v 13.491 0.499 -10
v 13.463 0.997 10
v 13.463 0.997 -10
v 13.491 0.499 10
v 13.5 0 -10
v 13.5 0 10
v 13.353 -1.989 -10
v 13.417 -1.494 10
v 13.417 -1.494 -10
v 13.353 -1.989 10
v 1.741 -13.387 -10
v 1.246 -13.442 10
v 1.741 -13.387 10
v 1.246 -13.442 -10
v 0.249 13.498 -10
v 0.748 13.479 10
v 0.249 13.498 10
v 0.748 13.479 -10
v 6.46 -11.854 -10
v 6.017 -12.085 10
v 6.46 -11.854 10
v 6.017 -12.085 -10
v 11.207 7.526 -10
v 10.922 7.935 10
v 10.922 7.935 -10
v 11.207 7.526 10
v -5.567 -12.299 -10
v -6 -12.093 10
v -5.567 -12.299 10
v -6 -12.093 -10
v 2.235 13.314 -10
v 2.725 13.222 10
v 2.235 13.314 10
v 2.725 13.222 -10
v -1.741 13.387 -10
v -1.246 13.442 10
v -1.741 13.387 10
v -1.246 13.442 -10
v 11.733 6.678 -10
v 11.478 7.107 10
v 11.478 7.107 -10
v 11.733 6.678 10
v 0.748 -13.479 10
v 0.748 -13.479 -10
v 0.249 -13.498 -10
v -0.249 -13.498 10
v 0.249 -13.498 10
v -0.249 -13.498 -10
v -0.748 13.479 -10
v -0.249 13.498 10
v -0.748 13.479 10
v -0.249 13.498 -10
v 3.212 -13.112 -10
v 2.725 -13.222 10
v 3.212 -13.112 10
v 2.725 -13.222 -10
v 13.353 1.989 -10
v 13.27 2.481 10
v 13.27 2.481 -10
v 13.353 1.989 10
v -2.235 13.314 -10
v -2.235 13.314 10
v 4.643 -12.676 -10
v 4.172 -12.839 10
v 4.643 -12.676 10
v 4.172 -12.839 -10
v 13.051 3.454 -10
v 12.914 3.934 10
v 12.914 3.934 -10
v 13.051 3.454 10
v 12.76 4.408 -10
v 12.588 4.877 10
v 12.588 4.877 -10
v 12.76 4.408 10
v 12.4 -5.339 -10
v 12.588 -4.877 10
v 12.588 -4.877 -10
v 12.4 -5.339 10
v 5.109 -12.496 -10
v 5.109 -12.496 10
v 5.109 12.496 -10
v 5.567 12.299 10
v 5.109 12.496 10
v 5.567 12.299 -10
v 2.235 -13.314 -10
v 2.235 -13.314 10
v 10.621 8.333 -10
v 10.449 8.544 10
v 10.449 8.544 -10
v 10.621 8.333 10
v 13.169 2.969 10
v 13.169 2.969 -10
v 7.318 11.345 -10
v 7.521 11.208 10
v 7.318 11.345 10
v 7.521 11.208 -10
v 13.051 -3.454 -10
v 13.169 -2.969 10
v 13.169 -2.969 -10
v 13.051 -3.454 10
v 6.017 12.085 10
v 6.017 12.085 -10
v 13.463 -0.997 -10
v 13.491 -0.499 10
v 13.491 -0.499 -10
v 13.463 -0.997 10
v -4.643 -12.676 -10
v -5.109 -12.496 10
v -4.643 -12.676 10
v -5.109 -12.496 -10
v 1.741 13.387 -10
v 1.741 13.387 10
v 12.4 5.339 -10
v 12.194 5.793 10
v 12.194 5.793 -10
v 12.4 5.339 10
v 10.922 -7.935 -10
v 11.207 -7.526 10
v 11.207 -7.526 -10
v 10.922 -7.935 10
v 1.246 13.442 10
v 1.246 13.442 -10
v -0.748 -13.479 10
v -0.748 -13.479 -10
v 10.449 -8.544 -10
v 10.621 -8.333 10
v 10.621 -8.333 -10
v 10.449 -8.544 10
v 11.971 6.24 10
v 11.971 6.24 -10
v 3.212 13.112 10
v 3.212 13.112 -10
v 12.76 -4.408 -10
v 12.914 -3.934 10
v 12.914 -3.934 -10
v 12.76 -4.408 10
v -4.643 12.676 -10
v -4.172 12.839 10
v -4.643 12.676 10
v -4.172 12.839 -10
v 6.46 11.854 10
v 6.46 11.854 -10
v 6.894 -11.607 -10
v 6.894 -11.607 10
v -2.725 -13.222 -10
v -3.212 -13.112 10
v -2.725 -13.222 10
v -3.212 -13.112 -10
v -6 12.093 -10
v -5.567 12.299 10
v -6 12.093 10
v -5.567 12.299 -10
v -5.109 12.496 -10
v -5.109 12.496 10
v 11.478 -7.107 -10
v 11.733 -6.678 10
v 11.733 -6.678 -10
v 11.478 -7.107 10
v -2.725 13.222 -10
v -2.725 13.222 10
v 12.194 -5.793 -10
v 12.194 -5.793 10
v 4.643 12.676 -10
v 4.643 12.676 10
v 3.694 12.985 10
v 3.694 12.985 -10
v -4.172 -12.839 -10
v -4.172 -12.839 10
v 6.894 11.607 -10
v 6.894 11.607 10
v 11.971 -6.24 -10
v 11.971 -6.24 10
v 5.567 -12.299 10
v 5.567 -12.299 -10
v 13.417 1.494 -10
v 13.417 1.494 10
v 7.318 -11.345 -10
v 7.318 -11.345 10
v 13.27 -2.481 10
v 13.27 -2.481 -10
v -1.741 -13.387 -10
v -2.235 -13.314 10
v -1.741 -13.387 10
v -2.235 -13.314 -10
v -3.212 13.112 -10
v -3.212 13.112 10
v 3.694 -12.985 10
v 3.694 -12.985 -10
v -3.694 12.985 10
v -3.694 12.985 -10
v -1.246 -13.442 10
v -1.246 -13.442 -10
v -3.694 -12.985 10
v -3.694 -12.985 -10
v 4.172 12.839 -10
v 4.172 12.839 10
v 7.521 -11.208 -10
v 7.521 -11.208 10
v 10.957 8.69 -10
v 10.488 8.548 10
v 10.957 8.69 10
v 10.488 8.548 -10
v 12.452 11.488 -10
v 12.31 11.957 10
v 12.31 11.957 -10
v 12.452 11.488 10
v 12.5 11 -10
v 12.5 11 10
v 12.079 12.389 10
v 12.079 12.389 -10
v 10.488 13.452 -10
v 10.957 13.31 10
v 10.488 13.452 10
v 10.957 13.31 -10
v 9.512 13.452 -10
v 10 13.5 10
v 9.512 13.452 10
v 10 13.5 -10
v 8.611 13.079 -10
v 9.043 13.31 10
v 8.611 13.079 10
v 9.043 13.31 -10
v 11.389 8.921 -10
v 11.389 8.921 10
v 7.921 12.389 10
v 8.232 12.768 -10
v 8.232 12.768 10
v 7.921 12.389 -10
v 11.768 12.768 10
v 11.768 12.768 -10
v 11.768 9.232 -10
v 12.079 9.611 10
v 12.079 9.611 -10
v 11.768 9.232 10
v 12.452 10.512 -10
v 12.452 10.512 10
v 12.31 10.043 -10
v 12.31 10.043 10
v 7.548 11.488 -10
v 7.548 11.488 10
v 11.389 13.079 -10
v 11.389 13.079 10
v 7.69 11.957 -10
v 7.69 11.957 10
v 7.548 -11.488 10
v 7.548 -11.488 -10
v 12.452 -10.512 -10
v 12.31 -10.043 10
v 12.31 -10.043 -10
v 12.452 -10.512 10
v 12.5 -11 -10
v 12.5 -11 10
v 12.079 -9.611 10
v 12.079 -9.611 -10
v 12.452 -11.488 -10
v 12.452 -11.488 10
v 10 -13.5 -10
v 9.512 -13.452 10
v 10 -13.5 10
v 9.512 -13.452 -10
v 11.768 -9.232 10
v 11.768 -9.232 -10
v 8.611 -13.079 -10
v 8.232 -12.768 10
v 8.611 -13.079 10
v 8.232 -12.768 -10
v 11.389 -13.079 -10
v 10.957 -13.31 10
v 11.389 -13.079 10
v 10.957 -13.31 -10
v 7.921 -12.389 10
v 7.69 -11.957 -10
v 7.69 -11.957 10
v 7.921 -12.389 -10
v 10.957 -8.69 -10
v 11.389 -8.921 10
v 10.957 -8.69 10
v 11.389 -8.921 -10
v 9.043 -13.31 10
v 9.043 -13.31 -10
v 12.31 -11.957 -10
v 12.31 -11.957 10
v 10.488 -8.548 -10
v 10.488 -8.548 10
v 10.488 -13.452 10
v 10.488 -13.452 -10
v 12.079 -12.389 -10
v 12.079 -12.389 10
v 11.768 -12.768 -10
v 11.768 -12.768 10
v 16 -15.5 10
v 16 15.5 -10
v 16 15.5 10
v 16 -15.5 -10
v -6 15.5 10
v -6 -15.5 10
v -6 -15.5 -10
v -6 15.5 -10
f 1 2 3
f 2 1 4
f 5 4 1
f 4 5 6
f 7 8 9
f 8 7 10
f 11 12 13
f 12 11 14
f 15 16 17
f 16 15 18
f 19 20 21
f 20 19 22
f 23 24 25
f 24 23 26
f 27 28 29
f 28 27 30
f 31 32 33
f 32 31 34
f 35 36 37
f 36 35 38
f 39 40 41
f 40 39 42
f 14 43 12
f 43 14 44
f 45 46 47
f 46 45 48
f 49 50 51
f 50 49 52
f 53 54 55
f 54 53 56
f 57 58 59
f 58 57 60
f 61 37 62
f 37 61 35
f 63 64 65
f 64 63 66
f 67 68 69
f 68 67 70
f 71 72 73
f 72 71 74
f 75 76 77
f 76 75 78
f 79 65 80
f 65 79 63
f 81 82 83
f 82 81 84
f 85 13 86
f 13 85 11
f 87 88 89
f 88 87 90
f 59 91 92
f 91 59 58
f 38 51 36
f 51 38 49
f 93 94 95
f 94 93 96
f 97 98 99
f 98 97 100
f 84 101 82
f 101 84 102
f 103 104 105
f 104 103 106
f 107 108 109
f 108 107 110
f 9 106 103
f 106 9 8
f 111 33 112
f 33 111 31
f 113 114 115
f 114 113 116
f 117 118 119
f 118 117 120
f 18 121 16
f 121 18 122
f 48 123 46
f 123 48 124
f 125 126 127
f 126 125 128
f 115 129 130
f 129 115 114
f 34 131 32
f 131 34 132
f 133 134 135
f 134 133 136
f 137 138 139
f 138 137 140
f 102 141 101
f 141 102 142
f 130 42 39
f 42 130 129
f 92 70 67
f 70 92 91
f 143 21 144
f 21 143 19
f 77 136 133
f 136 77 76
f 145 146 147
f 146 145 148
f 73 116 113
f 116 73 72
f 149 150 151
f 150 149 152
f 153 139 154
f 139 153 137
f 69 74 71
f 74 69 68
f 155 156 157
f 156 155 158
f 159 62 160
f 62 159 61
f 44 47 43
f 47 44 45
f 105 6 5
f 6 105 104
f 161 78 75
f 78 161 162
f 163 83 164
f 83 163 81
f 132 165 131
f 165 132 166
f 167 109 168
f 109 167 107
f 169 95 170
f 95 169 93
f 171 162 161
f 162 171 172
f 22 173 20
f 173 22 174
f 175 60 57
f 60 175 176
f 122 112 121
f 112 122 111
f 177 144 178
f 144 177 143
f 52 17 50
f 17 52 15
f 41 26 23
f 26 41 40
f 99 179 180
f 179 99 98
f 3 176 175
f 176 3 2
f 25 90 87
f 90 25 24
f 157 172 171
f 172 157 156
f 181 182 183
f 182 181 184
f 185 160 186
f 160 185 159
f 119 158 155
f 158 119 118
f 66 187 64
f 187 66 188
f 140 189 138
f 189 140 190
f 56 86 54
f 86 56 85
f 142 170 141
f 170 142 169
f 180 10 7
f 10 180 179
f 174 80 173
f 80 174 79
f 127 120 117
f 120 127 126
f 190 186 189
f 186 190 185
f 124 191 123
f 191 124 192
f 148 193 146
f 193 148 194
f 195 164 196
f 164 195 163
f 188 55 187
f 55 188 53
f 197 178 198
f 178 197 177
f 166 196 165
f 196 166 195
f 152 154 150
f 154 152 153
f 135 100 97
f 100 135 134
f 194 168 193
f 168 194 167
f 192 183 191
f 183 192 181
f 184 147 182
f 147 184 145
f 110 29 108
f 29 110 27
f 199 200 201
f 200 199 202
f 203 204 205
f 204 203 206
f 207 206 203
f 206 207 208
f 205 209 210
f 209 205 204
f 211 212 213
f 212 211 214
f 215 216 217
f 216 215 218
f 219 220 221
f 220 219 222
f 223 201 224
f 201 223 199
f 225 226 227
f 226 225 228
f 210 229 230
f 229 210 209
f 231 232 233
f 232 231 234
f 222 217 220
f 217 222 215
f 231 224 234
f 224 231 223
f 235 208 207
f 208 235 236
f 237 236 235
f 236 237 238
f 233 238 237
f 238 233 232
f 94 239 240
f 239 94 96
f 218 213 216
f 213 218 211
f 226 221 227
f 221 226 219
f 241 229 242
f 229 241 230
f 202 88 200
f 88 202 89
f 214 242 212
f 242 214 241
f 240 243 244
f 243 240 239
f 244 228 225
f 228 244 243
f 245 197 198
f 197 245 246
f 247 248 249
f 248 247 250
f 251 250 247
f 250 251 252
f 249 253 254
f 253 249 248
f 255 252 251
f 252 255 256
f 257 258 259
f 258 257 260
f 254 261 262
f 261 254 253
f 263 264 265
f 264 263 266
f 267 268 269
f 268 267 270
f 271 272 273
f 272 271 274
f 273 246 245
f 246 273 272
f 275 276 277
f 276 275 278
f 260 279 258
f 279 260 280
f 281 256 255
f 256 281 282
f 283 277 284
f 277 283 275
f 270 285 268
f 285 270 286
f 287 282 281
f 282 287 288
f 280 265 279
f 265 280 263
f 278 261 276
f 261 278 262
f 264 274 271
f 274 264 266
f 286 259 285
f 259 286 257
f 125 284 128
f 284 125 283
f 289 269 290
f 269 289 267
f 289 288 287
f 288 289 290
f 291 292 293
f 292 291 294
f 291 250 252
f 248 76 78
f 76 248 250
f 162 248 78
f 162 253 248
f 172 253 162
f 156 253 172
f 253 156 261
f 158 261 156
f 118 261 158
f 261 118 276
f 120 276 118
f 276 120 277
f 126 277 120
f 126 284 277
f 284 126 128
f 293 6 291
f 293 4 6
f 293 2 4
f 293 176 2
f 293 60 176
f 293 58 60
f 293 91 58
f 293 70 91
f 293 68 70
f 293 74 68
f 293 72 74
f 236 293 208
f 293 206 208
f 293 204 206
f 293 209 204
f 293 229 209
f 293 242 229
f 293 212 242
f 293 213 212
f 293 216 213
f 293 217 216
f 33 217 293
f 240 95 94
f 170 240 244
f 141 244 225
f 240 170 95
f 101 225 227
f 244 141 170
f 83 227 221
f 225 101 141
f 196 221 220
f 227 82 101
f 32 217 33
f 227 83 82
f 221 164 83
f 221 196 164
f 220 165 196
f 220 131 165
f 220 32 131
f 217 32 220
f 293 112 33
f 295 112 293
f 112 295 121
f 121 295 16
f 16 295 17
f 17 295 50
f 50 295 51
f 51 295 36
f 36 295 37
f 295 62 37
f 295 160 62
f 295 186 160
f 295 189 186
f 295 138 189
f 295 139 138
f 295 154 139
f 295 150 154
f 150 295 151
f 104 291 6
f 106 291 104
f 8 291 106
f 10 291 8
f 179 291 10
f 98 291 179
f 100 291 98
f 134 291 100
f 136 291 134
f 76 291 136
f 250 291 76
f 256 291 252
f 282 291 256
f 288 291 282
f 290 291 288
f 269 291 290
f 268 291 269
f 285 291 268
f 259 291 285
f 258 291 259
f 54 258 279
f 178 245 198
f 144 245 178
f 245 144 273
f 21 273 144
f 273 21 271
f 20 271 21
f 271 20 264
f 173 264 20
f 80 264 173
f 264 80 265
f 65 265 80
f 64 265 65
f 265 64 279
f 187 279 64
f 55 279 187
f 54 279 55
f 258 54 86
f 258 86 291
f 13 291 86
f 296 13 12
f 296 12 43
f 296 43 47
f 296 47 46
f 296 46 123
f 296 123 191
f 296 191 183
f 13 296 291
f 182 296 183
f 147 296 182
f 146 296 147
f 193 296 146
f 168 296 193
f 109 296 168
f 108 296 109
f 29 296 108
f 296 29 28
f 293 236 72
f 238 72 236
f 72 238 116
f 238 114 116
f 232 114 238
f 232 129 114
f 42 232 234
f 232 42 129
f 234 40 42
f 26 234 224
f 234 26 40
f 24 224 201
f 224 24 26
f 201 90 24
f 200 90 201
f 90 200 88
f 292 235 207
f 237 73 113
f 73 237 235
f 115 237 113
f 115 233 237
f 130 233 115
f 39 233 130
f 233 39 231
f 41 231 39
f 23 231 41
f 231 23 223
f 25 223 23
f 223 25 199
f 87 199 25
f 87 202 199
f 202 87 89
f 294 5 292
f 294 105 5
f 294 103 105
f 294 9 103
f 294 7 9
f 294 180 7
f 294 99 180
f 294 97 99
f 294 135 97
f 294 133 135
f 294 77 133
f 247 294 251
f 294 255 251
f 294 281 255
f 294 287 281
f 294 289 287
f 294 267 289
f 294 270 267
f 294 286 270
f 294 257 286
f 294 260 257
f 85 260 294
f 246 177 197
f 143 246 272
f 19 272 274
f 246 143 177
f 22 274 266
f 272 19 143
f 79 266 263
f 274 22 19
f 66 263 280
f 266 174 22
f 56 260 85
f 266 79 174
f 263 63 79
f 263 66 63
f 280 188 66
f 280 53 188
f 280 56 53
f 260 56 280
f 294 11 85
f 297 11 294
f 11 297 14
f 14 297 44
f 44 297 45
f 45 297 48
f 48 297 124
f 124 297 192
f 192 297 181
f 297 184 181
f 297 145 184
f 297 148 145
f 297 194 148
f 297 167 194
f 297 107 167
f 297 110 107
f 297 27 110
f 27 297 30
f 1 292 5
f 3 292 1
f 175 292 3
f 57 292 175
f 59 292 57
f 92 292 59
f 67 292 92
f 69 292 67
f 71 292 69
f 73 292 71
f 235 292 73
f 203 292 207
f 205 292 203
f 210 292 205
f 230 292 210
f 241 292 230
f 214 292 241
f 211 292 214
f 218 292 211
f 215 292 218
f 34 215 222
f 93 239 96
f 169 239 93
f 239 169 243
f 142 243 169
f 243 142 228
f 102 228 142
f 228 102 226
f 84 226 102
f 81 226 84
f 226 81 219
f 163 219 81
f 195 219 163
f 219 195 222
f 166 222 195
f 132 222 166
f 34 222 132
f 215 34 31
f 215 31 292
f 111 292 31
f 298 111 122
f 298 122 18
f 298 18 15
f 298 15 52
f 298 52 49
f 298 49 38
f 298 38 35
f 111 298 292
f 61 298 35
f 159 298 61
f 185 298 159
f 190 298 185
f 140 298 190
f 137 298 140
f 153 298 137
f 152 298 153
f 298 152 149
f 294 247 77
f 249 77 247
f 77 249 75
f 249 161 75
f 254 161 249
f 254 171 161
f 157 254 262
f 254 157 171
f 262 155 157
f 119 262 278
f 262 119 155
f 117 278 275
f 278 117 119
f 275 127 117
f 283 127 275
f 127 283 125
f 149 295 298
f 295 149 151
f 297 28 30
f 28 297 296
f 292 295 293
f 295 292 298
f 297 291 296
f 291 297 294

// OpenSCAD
$fs=0.5;
$fa=1;

grip_thickness = 4;

difference() {
  translate([5,0,0]) cube([22, 27+grip_thickness, 20], center=true);
  union() {
    cylinder(h=100, d=27, center=true);
    translate([10, 11, 0])
        cylinder(h=100, d=5, center=true);
    translate([10, -11, 0])
        cylinder(h=100, d=5, center=true);
  };
}
